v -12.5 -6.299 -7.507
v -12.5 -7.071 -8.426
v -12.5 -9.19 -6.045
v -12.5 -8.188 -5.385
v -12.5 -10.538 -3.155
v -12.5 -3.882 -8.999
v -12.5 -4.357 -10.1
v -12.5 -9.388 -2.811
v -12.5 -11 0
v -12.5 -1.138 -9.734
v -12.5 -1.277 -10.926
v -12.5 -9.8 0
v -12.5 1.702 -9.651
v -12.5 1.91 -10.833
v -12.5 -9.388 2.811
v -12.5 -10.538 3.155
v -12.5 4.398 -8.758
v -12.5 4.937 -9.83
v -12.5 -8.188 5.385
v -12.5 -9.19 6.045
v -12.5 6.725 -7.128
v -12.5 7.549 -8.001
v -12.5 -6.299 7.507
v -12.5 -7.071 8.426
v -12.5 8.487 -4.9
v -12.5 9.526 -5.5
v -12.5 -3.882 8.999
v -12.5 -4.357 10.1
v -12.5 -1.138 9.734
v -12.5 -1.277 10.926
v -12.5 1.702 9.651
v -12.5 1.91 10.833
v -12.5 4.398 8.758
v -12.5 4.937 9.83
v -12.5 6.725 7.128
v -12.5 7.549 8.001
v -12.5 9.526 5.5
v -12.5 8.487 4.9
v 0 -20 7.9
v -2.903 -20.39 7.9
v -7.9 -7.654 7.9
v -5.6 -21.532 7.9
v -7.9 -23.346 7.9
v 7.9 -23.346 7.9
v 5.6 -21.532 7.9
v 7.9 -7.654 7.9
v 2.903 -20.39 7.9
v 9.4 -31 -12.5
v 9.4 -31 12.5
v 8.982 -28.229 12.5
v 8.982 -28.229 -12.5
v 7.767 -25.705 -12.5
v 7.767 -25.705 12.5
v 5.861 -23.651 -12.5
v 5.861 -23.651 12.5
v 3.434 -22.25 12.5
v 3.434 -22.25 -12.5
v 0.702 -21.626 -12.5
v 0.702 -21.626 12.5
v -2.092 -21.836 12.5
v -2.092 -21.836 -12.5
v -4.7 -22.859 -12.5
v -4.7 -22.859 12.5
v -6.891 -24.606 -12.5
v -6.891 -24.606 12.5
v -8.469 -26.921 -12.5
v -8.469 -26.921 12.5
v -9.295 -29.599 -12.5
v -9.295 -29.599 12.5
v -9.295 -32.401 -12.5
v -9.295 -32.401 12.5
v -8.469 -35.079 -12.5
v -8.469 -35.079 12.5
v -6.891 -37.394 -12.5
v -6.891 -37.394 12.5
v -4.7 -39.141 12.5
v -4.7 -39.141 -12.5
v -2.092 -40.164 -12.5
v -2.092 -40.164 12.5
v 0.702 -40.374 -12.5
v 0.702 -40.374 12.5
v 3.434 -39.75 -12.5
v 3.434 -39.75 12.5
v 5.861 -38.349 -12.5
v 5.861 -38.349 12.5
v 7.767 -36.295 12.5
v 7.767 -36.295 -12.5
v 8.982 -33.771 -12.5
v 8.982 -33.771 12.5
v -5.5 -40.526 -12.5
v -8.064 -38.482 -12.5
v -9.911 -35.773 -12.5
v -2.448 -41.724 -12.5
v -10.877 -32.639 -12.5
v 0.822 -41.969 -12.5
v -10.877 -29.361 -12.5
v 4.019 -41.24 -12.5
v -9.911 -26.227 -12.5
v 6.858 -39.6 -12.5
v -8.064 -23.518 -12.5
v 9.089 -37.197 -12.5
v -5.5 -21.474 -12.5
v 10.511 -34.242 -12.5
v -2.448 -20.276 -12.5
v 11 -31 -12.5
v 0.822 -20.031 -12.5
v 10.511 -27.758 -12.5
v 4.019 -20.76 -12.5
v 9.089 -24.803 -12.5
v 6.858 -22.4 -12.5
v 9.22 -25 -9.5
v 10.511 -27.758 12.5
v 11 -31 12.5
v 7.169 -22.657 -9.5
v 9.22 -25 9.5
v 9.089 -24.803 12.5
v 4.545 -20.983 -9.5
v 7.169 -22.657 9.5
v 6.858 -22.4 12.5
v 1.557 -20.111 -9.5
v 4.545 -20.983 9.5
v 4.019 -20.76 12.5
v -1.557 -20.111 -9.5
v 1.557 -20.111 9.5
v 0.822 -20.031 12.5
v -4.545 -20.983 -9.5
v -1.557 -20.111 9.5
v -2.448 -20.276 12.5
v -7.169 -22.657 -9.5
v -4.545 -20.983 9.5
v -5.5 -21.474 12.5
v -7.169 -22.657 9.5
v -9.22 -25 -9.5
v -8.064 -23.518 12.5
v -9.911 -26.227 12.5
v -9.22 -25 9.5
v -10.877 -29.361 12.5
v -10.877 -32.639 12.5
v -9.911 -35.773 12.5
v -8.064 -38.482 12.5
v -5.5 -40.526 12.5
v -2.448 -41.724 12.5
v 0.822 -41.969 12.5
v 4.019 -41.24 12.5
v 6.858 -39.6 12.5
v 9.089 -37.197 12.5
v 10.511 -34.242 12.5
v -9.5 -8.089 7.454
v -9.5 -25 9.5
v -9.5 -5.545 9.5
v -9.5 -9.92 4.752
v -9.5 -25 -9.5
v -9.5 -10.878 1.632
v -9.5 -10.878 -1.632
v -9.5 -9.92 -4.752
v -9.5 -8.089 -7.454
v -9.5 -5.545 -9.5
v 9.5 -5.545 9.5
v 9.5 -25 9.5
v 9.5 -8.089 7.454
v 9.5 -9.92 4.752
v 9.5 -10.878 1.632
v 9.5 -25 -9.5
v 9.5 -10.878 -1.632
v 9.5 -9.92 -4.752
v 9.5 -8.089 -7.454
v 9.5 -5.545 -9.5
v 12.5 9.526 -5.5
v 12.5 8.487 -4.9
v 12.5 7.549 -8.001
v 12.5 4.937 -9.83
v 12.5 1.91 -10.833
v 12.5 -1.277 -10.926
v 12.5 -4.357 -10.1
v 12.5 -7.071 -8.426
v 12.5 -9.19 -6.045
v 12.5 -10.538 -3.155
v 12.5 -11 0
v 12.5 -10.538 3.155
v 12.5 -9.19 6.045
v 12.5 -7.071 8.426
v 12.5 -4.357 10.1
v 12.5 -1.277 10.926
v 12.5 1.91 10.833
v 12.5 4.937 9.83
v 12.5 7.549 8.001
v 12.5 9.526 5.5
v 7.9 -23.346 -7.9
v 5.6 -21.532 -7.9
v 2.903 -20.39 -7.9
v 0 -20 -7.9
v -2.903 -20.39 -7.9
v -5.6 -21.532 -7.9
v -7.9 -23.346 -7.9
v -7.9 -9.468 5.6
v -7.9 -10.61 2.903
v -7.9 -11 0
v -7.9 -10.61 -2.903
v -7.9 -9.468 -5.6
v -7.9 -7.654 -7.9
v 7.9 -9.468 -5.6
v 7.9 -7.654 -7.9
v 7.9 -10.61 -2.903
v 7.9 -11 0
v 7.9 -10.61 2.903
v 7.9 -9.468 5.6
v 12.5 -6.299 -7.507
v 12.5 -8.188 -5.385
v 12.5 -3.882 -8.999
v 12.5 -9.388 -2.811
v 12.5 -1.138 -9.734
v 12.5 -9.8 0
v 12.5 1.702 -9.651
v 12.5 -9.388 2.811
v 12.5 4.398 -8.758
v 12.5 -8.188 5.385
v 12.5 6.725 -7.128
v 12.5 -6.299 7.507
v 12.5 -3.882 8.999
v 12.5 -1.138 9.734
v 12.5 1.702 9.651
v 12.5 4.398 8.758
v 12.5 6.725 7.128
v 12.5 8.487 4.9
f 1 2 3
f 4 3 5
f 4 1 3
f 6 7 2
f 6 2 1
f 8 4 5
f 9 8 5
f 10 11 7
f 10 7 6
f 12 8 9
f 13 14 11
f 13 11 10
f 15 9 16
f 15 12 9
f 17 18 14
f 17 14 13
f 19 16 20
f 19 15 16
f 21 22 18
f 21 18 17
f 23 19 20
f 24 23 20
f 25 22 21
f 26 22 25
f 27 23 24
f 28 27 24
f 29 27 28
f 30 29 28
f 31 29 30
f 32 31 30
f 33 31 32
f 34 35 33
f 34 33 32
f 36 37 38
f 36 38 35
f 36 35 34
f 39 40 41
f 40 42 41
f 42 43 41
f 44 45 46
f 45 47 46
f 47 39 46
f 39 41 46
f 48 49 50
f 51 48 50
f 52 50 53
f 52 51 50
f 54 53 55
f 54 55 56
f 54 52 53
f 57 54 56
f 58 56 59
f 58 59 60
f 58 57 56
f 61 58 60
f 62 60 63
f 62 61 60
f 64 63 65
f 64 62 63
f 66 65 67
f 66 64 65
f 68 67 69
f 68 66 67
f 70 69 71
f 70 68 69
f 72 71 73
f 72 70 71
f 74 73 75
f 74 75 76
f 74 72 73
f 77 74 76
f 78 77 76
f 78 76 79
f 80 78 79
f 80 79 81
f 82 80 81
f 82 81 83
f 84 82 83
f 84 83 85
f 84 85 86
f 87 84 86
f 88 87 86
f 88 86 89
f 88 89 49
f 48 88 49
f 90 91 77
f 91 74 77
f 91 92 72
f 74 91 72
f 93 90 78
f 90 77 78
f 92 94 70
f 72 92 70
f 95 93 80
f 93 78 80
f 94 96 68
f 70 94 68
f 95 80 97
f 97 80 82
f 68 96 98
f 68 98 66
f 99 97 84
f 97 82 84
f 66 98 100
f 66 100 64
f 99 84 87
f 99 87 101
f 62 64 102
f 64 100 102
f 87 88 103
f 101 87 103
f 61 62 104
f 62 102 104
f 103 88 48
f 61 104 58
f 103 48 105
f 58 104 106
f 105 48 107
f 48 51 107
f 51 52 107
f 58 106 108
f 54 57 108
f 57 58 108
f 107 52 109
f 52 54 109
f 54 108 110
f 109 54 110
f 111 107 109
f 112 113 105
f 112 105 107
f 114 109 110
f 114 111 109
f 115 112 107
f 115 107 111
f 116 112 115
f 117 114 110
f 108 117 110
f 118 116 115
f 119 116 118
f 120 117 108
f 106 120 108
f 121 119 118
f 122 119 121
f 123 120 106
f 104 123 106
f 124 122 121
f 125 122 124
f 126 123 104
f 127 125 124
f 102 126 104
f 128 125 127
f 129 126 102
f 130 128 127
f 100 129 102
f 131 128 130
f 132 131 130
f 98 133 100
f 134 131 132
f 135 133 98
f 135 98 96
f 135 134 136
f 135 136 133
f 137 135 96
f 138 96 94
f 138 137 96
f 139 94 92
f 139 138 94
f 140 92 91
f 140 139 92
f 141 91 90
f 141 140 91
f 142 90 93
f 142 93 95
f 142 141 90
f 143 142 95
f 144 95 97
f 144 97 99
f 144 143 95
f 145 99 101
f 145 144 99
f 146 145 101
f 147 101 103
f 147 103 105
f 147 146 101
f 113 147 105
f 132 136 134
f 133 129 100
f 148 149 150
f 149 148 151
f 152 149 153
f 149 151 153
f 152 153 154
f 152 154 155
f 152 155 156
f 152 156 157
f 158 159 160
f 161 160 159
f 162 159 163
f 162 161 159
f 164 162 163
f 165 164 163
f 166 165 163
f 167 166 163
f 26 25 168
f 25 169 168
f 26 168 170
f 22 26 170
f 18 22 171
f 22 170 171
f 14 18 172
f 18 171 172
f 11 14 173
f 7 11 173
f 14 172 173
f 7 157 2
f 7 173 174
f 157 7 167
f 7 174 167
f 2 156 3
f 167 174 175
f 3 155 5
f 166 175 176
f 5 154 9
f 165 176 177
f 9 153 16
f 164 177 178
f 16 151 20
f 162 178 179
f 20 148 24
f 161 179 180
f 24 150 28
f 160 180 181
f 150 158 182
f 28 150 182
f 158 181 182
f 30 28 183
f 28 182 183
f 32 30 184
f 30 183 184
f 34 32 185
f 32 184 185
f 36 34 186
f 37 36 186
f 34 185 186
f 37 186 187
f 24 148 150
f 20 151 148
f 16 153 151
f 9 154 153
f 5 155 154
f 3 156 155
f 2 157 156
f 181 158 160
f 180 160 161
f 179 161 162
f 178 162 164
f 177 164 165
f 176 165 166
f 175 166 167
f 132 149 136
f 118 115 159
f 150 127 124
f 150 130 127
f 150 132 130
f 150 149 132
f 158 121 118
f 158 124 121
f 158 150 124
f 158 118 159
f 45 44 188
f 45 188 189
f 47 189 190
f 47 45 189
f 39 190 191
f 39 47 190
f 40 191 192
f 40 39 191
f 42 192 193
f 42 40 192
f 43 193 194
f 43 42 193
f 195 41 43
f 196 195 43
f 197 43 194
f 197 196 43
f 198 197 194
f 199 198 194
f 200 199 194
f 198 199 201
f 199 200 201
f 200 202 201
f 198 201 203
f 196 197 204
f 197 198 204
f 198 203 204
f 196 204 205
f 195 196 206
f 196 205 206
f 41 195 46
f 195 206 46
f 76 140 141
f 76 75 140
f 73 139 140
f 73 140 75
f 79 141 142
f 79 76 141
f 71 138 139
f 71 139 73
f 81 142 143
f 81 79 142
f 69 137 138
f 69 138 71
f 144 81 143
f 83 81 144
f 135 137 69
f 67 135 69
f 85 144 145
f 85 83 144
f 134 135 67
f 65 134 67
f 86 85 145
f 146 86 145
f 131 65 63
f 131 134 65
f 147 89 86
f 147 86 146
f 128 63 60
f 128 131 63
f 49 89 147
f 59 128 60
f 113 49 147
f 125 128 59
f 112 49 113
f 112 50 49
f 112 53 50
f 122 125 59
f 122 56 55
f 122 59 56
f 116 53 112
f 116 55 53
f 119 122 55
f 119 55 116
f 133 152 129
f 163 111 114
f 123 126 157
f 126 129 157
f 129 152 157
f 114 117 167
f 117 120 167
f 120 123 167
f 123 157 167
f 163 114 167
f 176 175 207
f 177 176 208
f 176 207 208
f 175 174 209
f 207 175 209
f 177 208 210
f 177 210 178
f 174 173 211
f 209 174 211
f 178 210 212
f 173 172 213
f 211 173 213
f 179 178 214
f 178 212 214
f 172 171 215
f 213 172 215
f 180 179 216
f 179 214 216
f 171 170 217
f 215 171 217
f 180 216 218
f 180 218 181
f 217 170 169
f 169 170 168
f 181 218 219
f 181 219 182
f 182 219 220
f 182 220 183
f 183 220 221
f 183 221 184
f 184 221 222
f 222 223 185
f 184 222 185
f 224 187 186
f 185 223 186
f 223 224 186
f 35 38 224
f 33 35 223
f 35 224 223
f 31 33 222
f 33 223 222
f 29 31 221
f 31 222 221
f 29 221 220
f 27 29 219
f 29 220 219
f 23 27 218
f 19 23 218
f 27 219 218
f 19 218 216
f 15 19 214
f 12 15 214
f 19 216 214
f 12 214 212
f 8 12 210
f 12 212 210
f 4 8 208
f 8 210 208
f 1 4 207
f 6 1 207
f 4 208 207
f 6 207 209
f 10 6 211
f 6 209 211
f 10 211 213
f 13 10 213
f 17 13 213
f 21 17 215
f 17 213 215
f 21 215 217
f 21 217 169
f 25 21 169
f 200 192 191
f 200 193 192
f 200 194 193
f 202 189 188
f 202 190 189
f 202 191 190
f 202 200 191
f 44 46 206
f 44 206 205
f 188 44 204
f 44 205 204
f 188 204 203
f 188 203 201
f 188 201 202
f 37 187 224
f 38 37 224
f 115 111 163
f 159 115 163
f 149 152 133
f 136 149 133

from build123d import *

# Parameters (mm, degrees)
BOSS_EXTRUDE1_DEPTH = 12.5
SKETCH3_W           = 19
SKETCH3_H           = 19
SKETCH3_W_2         = 15.8
SKETCH3_H_2         = 15.8
BOSS_EXTRUDE3_DEPTH = 25
SKETCH2_R           = 11
SKETCH2_R_2         = 9.4
BOSS_EXTRUDE2_DEPTH = 12.5
SKETCH4_R           = 9.8
CUT_EXTRUDE1_DEPTH  = 20
SKETCH5_R           = 9.4
CUT_EXTRUDE2_DEPTH  = 20


with BuildPart() as part:
    # Sketch1 → Boss-Extrude1 (new, symmetric)
    with BuildSketch(Plane(origin=(0, 0, 0), x_dir=(0, 0, -1), z_dir=(1, 0, 0))):
        with BuildLine():
            Line((-5.5, 9.526279442), (-4.9, 8.487048957))
            ThreePointArc((-4.9, 8.487048957), (0, -9.8), (4.9, 8.487048957))
            Line((4.9, 8.487048957), (5.5, 9.526279442))
            ThreePointArc((5.5, 9.526279442), (0, -11), (-5.5, 9.526279442))
        make_face()
    extrude(amount=BOSS_EXTRUDE1_DEPTH, both=True)

    # Sketch3 → Boss-Extrude3 (add)
    with BuildSketch(Plane(origin=(0, 0, 0), x_dir=(1, 0, 0), z_dir=(0, 1, 0))):
        Rectangle(SKETCH3_W, SKETCH3_H)
        Rectangle(SKETCH3_W_2, SKETCH3_H_2, mode=Mode.SUBTRACT)
    extrude(amount=-BOSS_EXTRUDE3_DEPTH)

    # Sketch2 → Boss-Extrude2 (add, symmetric)
    with BuildSketch(Plane.XY):
        with Locations((0, -31)):
            Circle(SKETCH2_R)
        with Locations((0, -31)):
            Circle(SKETCH2_R_2, mode=Mode.SUBTRACT)
    extrude(amount=BOSS_EXTRUDE2_DEPTH, both=True)

    # Sketch4 → Cut-Extrude1 (cut, symmetric)
    with BuildSketch(Plane(origin=(0, 0, 0), x_dir=(0, 0, -1), z_dir=(1, 0, 0))):
        Circle(SKETCH4_R)
    extrude(amount=CUT_EXTRUDE1_DEPTH, both=True, mode=Mode.SUBTRACT)

    # Sketch5 → Cut-Extrude2 (cut, symmetric)
    with BuildSketch(Plane.XY):
        with Locations((0, -31)):
            Circle(SKETCH5_R)
    extrude(amount=CUT_EXTRUDE2_DEPTH, both=True, mode=Mode.SUBTRACT)


solid = part.part
